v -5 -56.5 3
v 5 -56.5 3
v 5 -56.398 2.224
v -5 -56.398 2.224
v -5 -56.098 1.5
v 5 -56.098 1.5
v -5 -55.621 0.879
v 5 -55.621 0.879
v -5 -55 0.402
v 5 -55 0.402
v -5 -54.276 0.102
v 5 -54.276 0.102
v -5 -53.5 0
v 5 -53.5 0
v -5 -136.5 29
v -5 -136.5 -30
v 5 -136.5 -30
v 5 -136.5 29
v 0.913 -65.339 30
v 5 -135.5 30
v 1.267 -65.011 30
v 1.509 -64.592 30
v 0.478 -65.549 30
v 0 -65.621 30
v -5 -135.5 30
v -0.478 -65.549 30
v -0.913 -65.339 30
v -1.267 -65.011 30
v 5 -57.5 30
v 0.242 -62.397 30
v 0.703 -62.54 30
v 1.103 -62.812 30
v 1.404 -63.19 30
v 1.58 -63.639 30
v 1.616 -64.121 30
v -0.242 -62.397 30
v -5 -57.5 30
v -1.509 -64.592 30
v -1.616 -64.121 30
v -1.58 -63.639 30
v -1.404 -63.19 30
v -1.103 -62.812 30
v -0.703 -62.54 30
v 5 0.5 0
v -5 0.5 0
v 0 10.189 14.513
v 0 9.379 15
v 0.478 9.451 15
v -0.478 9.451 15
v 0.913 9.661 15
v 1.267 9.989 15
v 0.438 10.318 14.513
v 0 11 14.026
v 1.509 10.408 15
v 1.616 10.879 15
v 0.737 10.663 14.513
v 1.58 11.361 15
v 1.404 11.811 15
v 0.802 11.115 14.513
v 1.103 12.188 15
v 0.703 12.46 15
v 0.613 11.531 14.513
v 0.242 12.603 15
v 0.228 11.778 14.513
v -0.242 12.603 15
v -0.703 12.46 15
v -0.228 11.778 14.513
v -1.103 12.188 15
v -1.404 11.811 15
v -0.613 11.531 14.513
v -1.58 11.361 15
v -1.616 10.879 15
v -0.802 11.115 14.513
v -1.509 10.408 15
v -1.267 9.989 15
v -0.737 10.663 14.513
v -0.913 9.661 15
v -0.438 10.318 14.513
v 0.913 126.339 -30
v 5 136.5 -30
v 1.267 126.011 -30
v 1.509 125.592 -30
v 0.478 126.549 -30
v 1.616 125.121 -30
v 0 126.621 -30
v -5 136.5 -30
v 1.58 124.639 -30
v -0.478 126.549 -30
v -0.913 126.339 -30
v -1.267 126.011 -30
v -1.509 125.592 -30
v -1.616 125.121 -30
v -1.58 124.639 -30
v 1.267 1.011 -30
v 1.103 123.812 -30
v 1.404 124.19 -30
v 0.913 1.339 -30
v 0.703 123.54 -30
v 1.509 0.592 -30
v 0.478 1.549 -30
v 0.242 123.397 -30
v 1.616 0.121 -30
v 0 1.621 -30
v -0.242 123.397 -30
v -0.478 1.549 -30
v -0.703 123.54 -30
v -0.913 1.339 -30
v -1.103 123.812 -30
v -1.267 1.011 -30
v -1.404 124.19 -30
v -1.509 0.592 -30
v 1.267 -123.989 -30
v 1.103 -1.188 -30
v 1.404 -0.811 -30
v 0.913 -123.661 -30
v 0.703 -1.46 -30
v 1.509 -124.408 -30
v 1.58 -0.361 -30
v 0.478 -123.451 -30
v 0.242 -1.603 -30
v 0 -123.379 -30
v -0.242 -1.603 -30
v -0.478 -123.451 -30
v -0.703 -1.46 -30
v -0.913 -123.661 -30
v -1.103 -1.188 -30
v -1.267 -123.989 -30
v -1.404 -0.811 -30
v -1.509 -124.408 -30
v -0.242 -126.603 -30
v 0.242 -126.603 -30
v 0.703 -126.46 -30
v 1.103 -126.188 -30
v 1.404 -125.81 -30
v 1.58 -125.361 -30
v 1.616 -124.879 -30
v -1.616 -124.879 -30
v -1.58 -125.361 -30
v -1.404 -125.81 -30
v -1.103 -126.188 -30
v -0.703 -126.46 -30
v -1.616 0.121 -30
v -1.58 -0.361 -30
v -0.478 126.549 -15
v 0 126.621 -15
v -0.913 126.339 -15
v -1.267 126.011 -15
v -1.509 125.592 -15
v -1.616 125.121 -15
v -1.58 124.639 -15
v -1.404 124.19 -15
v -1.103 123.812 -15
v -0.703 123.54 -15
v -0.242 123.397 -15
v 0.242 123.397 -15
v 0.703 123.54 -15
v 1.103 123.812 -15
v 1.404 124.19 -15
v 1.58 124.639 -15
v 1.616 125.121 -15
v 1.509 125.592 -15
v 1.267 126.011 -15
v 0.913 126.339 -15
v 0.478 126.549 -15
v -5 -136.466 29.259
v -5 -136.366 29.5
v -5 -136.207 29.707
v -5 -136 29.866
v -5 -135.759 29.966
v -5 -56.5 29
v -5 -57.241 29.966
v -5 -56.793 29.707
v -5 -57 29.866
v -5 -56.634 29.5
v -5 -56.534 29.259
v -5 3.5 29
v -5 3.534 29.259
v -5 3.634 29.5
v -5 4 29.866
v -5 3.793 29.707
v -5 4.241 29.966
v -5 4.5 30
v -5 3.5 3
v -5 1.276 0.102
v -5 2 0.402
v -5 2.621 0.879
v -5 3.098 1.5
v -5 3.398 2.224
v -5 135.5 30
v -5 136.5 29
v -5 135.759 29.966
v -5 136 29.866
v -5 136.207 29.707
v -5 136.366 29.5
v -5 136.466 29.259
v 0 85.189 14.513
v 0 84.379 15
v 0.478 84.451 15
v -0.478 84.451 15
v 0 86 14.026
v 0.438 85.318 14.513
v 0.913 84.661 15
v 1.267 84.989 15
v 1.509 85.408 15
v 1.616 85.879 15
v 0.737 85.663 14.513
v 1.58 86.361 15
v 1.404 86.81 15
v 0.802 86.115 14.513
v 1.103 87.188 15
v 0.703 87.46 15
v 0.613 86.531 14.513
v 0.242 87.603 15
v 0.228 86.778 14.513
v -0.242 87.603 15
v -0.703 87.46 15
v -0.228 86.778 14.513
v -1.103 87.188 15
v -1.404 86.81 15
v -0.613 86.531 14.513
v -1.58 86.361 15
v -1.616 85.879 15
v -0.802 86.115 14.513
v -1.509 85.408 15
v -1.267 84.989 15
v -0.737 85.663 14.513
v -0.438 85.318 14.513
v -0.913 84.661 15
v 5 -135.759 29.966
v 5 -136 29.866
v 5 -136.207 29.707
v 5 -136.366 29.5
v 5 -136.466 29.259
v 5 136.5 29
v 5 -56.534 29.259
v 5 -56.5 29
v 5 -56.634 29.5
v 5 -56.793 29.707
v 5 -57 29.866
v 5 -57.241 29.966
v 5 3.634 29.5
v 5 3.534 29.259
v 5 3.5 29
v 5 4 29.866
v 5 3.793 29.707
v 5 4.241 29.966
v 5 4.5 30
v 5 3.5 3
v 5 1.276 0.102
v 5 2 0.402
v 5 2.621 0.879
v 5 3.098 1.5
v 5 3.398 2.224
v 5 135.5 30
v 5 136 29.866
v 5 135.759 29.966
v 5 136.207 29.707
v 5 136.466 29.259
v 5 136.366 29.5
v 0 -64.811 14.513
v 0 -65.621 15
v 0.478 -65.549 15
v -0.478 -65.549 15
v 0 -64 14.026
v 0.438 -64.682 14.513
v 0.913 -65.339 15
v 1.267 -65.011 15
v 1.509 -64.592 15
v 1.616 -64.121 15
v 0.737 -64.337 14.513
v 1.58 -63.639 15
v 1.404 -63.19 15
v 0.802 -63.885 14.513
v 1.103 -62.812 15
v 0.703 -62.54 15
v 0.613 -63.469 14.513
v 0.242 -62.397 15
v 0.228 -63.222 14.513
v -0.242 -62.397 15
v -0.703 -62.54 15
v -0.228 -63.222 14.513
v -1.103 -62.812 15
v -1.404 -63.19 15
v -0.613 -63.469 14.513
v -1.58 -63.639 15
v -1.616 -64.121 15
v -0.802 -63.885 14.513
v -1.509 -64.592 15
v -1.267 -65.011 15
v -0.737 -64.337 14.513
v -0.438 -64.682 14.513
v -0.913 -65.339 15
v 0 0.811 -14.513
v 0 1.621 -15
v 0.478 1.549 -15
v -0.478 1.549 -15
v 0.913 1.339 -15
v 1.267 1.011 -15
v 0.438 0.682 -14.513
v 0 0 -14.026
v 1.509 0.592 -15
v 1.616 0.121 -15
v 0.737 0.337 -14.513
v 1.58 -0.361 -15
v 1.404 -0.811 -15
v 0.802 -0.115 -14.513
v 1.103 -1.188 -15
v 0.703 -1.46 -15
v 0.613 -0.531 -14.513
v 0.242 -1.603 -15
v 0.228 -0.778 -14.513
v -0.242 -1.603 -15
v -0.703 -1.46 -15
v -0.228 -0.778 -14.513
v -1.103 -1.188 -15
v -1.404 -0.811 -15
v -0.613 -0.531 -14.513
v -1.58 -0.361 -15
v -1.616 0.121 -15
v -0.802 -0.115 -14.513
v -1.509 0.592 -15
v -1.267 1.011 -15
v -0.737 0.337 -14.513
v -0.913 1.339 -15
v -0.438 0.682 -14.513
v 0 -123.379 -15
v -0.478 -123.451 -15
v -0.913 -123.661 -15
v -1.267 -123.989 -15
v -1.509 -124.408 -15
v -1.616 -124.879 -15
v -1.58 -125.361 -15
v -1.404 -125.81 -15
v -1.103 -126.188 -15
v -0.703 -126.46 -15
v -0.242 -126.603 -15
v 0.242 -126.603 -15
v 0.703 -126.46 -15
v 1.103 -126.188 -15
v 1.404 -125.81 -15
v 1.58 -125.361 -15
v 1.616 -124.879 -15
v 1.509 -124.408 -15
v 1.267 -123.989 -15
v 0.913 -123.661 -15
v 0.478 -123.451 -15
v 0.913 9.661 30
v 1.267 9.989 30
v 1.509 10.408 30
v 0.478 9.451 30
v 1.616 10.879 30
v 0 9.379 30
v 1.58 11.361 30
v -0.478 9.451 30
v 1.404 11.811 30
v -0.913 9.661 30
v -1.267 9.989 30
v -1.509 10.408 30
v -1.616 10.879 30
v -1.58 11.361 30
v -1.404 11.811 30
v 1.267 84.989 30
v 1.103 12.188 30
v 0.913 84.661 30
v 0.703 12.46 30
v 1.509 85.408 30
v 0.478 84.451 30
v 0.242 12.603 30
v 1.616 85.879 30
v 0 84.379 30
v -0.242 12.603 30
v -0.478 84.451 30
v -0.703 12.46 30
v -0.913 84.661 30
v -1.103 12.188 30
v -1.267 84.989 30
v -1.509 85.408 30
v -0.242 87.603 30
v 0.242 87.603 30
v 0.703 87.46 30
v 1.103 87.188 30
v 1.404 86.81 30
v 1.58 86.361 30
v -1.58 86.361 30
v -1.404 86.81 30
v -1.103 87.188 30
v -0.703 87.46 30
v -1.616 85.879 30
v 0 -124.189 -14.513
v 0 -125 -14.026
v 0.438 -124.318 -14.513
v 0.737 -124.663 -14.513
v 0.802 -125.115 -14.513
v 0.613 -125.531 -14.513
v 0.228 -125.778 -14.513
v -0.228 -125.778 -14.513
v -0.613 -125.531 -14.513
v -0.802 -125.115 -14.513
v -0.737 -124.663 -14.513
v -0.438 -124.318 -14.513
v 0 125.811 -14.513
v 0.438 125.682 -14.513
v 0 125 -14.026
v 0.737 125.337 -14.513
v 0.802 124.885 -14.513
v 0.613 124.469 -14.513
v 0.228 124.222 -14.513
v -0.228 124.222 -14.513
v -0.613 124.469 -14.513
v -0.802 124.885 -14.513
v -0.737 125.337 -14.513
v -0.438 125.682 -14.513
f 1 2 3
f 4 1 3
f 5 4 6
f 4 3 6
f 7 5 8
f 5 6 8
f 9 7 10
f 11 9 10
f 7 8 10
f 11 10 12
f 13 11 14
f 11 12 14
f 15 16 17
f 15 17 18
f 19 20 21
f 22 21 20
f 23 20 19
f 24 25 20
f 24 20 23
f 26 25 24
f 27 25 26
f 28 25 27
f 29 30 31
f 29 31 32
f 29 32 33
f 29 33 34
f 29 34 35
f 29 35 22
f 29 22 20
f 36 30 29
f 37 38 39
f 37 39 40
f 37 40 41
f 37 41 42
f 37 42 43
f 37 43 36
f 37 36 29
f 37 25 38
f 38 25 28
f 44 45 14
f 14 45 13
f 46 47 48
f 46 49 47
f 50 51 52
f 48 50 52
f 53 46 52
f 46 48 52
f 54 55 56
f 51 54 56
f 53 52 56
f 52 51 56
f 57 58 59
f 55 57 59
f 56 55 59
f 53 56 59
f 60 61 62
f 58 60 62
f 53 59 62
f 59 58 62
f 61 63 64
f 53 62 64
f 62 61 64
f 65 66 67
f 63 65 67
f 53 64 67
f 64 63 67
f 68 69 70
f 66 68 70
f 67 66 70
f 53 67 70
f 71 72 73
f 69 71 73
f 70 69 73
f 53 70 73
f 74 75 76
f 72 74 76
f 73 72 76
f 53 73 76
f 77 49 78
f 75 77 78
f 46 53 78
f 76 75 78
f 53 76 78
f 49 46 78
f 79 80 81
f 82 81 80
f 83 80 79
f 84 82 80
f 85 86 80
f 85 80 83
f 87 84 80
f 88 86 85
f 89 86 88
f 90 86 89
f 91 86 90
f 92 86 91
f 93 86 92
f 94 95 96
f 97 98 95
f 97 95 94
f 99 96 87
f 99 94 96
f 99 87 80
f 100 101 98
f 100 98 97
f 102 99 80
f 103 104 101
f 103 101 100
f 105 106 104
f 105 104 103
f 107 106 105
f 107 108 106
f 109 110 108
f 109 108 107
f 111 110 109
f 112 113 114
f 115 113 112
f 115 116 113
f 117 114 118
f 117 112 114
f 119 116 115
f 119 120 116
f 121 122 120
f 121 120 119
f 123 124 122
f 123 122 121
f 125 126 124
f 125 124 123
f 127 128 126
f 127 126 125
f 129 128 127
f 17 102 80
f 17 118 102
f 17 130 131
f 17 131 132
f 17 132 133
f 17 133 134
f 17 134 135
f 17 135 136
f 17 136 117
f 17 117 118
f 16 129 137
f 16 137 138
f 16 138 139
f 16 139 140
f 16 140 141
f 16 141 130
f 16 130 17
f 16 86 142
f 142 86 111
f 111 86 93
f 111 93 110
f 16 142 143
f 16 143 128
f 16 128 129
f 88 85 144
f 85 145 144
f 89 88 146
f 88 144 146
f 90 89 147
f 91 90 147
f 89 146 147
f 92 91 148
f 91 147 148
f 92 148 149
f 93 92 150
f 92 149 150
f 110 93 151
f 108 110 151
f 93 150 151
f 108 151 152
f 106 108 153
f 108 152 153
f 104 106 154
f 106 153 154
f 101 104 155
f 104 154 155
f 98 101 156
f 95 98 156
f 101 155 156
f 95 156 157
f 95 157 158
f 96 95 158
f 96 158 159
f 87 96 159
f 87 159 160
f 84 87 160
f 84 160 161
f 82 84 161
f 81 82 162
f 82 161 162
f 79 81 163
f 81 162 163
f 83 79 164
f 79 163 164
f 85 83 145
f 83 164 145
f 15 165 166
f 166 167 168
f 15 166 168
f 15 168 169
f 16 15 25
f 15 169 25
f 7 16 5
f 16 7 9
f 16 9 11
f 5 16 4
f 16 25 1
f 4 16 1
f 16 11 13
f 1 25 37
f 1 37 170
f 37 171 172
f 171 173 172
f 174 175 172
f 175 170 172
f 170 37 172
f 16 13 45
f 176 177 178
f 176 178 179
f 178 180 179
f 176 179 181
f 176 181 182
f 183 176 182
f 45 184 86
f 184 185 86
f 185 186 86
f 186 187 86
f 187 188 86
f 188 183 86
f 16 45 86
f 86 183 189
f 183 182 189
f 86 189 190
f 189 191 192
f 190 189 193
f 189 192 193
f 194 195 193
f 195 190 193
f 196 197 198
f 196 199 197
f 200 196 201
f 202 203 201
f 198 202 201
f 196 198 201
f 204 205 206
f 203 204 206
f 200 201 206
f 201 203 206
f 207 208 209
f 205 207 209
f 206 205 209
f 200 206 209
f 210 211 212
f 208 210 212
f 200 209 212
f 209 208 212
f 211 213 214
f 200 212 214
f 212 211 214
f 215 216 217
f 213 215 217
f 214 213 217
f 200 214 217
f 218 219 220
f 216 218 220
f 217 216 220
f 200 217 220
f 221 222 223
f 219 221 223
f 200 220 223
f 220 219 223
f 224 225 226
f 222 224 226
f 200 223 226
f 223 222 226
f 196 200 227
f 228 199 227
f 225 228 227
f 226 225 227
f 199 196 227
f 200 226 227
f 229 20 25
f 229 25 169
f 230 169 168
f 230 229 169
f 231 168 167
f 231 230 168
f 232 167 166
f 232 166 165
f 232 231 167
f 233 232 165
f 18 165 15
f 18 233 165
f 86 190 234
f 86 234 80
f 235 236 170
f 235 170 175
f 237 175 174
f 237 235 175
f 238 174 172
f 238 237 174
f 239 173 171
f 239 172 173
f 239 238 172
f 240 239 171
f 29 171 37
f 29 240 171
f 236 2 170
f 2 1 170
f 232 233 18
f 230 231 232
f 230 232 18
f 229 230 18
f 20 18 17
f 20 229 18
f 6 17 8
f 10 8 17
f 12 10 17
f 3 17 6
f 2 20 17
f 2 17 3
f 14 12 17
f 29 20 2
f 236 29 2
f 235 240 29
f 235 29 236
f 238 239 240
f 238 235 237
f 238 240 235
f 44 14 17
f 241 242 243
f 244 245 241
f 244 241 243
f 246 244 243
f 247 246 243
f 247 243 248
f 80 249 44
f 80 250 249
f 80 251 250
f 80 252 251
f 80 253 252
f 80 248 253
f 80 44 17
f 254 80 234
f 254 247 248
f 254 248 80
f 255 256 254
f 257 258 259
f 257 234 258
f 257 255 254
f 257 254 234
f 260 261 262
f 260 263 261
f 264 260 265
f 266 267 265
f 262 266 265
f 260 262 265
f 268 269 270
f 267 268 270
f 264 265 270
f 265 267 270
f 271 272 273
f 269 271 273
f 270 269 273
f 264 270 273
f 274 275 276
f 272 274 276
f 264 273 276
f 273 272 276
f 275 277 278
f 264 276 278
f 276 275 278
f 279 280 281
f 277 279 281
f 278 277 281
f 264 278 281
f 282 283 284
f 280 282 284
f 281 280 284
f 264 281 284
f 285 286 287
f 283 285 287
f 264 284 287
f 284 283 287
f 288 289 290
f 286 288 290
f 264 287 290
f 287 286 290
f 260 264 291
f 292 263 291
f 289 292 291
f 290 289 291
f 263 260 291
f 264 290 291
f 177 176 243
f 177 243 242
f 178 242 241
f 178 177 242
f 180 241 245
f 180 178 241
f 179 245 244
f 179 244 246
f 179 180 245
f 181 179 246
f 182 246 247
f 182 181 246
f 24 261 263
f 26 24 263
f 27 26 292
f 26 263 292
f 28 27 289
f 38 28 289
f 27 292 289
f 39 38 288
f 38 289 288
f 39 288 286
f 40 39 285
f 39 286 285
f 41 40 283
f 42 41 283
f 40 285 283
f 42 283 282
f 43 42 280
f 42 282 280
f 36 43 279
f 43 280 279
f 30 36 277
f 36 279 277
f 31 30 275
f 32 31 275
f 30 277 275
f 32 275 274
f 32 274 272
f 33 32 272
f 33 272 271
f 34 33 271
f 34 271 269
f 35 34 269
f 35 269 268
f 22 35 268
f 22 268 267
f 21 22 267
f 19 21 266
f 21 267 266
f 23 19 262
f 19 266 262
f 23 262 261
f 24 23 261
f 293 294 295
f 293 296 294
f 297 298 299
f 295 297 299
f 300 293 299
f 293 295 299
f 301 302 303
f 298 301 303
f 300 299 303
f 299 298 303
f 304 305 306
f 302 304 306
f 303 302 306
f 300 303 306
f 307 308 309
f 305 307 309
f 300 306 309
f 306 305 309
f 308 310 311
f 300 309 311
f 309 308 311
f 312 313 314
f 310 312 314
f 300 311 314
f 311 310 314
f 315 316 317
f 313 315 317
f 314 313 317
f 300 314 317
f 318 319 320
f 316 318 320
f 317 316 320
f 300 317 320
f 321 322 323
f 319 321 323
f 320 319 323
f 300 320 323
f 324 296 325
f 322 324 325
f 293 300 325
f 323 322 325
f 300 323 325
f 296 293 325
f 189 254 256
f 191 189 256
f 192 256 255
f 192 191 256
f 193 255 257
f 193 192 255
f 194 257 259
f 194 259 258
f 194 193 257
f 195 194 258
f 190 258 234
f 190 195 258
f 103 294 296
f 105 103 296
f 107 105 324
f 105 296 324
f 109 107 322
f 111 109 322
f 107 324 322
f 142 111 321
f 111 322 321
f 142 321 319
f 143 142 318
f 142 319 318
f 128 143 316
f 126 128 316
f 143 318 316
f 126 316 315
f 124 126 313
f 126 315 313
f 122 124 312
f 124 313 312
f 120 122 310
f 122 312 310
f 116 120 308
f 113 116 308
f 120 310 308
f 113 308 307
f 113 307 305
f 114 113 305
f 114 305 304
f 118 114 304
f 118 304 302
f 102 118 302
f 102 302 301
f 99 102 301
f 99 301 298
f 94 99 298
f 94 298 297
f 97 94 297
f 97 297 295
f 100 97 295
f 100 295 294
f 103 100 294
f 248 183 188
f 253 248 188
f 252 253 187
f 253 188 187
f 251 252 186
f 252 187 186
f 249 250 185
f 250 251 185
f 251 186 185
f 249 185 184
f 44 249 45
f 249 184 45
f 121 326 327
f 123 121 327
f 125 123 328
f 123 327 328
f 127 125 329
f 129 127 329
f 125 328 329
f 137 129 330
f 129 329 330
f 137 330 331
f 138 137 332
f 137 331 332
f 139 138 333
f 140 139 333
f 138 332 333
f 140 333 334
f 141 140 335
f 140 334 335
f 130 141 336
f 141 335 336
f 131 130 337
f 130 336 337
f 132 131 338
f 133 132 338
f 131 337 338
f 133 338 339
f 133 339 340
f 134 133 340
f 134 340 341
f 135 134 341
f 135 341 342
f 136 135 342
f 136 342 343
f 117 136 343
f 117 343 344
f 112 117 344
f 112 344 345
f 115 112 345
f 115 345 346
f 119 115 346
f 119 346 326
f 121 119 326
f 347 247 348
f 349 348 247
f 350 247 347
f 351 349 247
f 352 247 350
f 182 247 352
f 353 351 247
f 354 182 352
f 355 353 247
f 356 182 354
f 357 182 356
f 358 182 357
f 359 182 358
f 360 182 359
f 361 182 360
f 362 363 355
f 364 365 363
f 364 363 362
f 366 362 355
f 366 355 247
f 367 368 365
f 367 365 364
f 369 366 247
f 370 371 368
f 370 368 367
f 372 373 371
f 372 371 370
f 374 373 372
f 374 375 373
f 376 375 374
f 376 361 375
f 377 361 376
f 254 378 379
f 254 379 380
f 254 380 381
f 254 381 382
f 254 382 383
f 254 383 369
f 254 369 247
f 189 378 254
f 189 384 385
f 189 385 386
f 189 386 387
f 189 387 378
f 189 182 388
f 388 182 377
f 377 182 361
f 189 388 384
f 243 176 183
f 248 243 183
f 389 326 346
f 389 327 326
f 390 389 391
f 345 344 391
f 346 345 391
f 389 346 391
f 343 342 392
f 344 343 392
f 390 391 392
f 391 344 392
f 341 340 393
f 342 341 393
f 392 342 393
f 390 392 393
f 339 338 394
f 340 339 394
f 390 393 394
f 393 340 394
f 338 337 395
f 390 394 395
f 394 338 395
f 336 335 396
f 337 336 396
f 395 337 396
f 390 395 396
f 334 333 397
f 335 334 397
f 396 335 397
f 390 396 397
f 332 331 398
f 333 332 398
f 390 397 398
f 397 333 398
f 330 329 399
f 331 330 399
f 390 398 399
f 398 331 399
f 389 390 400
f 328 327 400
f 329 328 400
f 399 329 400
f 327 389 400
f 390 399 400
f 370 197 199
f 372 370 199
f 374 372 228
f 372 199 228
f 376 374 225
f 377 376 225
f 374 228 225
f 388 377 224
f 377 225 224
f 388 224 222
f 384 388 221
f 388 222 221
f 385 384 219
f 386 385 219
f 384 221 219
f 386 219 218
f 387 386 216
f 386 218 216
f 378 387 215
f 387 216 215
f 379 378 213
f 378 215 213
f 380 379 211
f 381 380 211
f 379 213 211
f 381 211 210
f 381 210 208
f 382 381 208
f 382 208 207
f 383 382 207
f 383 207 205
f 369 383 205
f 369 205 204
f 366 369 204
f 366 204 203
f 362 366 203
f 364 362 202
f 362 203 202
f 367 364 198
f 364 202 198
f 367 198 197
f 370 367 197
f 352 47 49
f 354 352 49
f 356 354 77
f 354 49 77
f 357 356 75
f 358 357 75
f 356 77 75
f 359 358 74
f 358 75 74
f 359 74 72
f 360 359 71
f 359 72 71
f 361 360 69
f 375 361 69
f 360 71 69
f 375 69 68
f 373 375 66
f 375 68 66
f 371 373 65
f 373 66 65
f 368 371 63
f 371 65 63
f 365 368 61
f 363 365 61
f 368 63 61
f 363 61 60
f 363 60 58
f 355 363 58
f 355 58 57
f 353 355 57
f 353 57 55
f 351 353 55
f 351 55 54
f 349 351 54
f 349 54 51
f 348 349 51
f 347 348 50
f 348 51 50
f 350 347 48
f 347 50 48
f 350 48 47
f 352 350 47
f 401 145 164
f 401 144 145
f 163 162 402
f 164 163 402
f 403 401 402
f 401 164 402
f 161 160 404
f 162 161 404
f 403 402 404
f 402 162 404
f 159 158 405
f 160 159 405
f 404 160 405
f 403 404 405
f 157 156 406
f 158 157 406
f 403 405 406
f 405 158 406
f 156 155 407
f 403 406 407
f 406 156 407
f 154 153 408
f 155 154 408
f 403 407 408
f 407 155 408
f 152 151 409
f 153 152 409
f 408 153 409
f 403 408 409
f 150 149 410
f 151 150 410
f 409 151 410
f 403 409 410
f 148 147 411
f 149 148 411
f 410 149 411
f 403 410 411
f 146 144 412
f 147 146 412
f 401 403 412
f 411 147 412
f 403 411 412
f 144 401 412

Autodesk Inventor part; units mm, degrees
ref_plane "YZ Plane" through (0, 0, 0) normal (1, 0, 0) x (0, 1, 0)
ref_plane "XZ Plane" through (0, 0, 0) normal (0, 1, 0) x (-1, 0, 0)
ref_plane "XY Plane" through (0, 0, 0) normal (0, 0, 1) x (1, 0, 0)
sketch "Sketch1" plane through (0, 0, 0) normal (1, 0, 0) x (0, 1, 0)
  line L0 (-191.1, 0) -> (191.1, 0) construction
  line L1 (0, -46) -> (0, 66) construction
  line L2 (-136.5, 30) -> (136.5, 30)
  line L3 (136.5, 30) -> (136.5, -30)
  line L4 (136.5, -30) -> (-136.5, -30)
  line L5 (-136.5, -30) -> (-136.5, 30)
  line L6 (105.4423, 30) -> (136.5, 50)
  line L7 (136.5, 50) -> (136.5, 30)
  circle A0 centre (133.5, 44.4999) radius 3
  circle A1 centre (115.5, 32.9086) radius 3
  line L8 (-136.5, 30) -> (103.5, 30) construction
  line L9 (103.5, 30) -> (103.5, 38) construction
  line L10 (103.5, 38) -> (-136.5, 38) construction
  line L11 (-136.5, 38) -> (-136.5, 30) construction
  line L12 (112.5, 34.5449) -> (112.5, 30)
  circle A2 centre (109.5, 30) radius 3
  circle A3 centre (109.5, 33) radius 3
  line L13 (-56.5, 30) -> (3.5, 30)
  line L14 (3.5, 30) -> (3.5, 0)
  line L15 (3.5, 0) -> (-56.5, 0)
  line L16 (-56.5, 0) -> (-56.5, 30)
  line L17 (-26.5, 0) -> (-26.5, 30) construction
  point P0 (0, 0)
  point P1 (106.5, 30)
  dimension "d6" = 6
  dimension "d1" = 32.78
  dimension "d2" = 6
  dimension "d3" = 8
  dimension "d4" = 240
  dimension "d7" = 60
  dimension "d35" = 147.22
  dimension "d36" = 273
  dimension "d37" = 20
  dimension "d38" = 24
  dimension "d39" = 110
  dimension "d40" = 60
  dimension "d41" = 30
extrude "Extrusion1" add sketch "Sketch1" along normal mid plane 10 contours L2 L16 L15 L14 A2 A1 L3 L4 L5 | L2 L14 L15 L16 | L2 A2 | A1 L2 picked at (115.4176, 29.9729)
extrude "Extrusion2" cut sketch "Sketch1" along normal through all both and the other way through all contours L2 L14 L15 L16
sketch "Sketch2" plane through (-5, -136.5, 30) normal (0, 0, 1) x (1, 0, 0)
  line L0 (5, -54.6) -> (5, 327.6) construction
  line L1 (0, 0) -> (10, 0) projected
  point P0 (5, 136.5)
  point P1 (5, 72.5)
  point P2 (5, 147.5)
  point P3 (5, 222.5)
  dimension "d11" = 72.5
  dimension "d12" = 75
  dimension "d13" = 75
hole "Hole1" at (0, -64, 30) at (0, 11, 30) at (0, 86, 30) direction (0, 0, -1) diameter 3.242 depth 15 tip angle 118 thread size "M4x0.7" class "6H" standard "ISO Metric profile"
sketch "Sketch3" plane through (5, 136.5, -30) normal (0, 0, -1) x (-1, 0, 0)
  line L0 (12, -136.5) -> (-2, -136.5) construction
  line L1 (5, -327.6) -> (5, 54.6) construction
  point P0 (5, -136.5)
  point P1 (5, -261.5)
  point P2 (5, -136.5)
  point P3 (5, -11.5)
  dimension "d21" = 250
hole "Hole2" at (0, -125, -30) at (0, 0, -30) at (0, 125, -30) direction (0, 0, 1) diameter 3.242 depth 15 tip angle 118 thread size "M4x0.7" class "6H" standard "ISO Metric profile"
fillet "Fillet1" radius 3 2 edges at (0, -56.5, 0) (0, 3.5, 0)
fillet "Fillet1" radius 1 4 edges at (0, -56.5, 30) (0, 3.5, 30) (0, -136.5, 30) (0, 136.5, 30)
properties part number "GRJ-04-103" material "Fenolite OR"
